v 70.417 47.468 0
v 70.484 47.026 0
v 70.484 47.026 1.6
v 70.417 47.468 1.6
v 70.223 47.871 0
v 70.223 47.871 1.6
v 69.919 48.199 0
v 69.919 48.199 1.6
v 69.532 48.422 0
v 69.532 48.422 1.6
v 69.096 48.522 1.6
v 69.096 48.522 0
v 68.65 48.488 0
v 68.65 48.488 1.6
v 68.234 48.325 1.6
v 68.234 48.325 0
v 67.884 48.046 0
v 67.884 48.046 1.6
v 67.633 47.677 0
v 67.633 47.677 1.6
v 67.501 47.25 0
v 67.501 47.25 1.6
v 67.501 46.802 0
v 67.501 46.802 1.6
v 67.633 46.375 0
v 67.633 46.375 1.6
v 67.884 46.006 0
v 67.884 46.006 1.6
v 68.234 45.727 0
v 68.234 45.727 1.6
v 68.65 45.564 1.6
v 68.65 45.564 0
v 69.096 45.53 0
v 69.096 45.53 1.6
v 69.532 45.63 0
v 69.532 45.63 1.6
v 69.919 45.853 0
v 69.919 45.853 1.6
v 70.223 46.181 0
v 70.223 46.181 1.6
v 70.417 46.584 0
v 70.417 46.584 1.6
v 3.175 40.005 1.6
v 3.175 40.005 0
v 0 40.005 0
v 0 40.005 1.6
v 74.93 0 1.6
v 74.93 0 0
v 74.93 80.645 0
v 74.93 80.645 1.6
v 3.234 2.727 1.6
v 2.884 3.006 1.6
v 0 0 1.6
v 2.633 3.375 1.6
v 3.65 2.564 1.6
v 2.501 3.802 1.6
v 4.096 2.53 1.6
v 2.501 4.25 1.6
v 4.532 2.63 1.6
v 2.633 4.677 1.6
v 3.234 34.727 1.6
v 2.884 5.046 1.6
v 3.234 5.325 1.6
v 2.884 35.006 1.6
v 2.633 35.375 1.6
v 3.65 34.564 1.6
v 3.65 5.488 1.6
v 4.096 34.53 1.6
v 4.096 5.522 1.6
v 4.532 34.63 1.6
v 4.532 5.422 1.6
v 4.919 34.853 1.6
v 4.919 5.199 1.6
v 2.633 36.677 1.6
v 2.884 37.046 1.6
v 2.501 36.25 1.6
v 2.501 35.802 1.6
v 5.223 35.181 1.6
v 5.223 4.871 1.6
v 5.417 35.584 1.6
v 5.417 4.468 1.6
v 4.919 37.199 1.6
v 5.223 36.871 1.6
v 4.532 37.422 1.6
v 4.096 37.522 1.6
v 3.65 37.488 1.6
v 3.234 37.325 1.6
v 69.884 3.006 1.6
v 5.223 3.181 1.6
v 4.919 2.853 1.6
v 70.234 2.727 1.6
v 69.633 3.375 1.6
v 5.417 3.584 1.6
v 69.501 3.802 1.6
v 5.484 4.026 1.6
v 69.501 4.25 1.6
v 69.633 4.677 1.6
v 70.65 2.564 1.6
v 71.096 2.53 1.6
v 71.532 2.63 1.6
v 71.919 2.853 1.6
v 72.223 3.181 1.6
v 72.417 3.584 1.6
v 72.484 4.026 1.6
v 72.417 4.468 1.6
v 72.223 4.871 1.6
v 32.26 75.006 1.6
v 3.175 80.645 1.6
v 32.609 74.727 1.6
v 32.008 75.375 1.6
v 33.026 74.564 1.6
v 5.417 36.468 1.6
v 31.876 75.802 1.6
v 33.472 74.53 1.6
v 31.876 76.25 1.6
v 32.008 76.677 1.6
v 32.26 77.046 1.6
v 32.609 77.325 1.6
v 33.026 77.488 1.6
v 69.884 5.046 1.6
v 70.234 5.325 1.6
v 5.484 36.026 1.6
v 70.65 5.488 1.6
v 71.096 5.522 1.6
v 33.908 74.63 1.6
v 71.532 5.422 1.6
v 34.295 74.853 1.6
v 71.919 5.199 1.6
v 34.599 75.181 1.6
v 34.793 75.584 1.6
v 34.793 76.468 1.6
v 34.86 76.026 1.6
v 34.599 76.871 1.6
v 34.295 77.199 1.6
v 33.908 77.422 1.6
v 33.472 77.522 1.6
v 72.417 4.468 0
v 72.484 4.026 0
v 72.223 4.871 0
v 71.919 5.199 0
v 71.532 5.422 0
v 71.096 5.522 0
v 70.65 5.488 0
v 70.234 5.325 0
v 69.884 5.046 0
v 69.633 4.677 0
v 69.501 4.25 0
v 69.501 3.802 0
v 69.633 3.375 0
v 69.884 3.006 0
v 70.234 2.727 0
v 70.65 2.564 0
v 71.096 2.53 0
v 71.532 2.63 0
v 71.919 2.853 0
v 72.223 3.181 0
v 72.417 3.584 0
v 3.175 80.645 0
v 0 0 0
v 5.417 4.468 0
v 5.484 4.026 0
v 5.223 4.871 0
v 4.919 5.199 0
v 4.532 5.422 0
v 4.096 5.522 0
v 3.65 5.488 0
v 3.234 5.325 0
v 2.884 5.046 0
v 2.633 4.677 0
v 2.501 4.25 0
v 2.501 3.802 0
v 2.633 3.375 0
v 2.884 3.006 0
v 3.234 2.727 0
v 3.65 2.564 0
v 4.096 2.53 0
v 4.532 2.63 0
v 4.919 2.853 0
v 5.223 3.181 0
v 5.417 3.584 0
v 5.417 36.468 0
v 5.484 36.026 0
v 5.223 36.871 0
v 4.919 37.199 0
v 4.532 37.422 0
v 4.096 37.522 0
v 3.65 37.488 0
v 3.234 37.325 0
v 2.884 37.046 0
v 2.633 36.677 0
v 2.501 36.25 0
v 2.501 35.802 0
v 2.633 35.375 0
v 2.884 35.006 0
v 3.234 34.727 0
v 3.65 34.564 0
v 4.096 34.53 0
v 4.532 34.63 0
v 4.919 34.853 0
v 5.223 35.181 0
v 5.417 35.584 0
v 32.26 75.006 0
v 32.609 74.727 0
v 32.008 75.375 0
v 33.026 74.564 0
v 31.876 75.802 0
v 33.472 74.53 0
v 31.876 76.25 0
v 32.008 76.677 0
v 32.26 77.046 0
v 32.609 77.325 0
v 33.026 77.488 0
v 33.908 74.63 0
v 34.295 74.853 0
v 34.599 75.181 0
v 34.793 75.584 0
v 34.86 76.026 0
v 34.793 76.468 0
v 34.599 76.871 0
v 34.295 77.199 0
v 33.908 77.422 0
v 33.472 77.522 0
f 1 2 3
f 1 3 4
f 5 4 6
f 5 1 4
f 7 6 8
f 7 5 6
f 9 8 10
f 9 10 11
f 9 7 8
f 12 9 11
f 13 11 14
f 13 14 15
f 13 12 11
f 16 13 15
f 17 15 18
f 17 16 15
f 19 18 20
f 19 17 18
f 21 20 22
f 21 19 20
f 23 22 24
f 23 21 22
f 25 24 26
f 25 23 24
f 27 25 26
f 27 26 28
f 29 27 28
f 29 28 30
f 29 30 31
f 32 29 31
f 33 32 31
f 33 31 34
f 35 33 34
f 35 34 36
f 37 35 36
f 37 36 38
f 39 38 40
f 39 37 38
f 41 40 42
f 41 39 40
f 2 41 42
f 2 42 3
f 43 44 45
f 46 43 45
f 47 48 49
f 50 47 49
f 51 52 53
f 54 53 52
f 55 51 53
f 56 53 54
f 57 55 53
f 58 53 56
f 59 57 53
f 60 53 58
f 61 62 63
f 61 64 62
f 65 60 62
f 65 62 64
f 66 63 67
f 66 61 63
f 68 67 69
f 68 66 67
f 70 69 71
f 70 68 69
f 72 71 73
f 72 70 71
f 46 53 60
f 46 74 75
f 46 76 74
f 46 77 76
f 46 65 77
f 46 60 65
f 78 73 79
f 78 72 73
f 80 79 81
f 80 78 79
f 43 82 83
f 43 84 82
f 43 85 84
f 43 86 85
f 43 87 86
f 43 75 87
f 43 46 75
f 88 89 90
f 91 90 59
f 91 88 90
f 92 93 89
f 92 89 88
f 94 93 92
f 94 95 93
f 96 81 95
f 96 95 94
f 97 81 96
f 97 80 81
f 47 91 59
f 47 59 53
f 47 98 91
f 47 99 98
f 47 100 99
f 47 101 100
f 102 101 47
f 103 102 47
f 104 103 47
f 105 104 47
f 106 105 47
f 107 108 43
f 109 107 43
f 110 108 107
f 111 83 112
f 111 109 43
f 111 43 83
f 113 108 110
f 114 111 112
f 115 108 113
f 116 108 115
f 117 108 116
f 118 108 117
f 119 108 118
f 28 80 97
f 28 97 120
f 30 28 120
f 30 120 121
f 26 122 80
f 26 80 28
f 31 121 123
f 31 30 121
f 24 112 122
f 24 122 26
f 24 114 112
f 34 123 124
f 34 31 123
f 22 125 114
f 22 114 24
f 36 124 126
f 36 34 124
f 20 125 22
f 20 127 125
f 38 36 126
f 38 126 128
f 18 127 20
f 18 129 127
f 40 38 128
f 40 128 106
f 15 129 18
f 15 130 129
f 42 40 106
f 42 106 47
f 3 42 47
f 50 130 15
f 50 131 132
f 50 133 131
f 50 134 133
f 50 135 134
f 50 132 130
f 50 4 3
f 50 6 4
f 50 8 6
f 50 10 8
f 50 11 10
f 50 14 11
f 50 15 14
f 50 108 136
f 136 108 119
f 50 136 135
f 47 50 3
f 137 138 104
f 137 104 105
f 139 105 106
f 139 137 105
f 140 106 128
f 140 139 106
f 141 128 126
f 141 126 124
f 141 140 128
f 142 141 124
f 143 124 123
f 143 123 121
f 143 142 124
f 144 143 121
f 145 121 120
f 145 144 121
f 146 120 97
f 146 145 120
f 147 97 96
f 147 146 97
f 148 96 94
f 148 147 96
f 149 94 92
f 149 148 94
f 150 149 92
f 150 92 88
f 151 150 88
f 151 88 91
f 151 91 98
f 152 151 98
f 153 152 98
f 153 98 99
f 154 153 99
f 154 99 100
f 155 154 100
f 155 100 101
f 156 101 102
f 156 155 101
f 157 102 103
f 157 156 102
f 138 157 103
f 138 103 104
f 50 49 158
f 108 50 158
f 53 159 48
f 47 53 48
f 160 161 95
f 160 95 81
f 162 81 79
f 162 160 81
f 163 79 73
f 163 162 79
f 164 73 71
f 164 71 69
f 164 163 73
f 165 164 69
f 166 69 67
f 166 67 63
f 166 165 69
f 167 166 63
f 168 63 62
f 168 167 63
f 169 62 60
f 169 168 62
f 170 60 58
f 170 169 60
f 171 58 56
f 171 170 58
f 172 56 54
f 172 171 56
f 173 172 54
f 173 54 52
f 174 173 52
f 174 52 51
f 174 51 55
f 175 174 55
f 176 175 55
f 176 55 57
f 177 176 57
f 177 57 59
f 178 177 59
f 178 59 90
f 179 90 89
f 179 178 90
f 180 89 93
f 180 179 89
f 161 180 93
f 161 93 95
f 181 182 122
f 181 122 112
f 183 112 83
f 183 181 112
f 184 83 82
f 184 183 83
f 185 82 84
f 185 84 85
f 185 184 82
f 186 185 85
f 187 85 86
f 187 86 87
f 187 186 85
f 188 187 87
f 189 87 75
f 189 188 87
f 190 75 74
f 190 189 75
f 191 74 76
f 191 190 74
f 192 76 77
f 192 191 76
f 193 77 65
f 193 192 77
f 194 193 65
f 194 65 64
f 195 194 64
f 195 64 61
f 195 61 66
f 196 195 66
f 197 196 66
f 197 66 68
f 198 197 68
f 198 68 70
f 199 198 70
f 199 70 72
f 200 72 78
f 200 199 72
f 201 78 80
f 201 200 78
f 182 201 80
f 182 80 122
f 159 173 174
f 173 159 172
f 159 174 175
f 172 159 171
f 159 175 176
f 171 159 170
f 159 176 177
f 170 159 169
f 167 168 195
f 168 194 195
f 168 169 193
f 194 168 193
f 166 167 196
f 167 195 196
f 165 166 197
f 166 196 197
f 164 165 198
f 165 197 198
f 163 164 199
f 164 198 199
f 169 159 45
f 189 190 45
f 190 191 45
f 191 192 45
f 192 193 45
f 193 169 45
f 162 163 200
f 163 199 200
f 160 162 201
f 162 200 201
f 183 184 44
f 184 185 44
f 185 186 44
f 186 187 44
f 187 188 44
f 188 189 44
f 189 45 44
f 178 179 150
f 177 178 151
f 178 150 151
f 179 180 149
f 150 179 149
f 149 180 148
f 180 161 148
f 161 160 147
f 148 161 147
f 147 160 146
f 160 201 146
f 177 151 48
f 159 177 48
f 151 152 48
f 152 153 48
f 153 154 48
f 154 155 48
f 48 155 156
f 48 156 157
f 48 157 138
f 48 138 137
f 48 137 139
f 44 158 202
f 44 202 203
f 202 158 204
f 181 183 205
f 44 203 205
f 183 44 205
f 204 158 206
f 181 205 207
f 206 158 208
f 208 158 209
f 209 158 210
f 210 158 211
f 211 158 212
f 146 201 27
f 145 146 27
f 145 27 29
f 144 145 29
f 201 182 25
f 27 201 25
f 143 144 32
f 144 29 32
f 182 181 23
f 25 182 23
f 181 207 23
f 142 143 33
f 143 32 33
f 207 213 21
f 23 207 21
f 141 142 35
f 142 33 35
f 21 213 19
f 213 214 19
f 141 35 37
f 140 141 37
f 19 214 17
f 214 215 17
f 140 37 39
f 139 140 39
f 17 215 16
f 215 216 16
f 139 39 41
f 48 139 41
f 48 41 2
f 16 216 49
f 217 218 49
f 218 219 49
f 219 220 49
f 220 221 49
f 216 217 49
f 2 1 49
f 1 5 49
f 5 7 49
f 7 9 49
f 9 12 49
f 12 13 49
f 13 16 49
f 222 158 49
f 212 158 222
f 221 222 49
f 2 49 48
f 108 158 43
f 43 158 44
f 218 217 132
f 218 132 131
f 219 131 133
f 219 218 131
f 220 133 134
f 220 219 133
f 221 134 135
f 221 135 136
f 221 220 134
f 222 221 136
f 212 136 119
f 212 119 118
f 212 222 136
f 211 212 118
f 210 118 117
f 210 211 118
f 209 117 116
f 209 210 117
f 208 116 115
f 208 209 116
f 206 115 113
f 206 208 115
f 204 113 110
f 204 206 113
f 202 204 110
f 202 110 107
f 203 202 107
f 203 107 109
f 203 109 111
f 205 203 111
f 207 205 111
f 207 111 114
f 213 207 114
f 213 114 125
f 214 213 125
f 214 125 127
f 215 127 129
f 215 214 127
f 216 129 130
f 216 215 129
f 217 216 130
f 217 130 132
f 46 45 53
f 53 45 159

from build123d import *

# Parameters (mm, degrees)
SKETCH1_R           = 1.5
BOSS_EXTRUDE1_DEPTH = 1.6002


with BuildPart() as part:
    # Sketch1 → Boss-Extrude1 (new body)
    with BuildSketch(Plane.XY):
        Polygon((74.93, 80.645), (3.175, 80.645), (3.175, 40.005), (0, 40.005), (0, 0), (74.93, 0), align=None)
        with Locations((68.984, 47.026)):
            Circle(SKETCH1_R, mode=Mode.SUBTRACT)
        with Locations((33.3595, 76.026)):
            Circle(SKETCH1_R, mode=Mode.SUBTRACT)
        with Locations((3.984, 36.026)):
            Circle(SKETCH1_R, mode=Mode.SUBTRACT)
        with Locations((70.984, 4.026)):
            Circle(SKETCH1_R, mode=Mode.SUBTRACT)
        with Locations((3.984, 4.026)):
            Circle(SKETCH1_R, mode=Mode.SUBTRACT)
    extrude(amount=BOSS_EXTRUDE1_DEPTH)


solid = part.part
